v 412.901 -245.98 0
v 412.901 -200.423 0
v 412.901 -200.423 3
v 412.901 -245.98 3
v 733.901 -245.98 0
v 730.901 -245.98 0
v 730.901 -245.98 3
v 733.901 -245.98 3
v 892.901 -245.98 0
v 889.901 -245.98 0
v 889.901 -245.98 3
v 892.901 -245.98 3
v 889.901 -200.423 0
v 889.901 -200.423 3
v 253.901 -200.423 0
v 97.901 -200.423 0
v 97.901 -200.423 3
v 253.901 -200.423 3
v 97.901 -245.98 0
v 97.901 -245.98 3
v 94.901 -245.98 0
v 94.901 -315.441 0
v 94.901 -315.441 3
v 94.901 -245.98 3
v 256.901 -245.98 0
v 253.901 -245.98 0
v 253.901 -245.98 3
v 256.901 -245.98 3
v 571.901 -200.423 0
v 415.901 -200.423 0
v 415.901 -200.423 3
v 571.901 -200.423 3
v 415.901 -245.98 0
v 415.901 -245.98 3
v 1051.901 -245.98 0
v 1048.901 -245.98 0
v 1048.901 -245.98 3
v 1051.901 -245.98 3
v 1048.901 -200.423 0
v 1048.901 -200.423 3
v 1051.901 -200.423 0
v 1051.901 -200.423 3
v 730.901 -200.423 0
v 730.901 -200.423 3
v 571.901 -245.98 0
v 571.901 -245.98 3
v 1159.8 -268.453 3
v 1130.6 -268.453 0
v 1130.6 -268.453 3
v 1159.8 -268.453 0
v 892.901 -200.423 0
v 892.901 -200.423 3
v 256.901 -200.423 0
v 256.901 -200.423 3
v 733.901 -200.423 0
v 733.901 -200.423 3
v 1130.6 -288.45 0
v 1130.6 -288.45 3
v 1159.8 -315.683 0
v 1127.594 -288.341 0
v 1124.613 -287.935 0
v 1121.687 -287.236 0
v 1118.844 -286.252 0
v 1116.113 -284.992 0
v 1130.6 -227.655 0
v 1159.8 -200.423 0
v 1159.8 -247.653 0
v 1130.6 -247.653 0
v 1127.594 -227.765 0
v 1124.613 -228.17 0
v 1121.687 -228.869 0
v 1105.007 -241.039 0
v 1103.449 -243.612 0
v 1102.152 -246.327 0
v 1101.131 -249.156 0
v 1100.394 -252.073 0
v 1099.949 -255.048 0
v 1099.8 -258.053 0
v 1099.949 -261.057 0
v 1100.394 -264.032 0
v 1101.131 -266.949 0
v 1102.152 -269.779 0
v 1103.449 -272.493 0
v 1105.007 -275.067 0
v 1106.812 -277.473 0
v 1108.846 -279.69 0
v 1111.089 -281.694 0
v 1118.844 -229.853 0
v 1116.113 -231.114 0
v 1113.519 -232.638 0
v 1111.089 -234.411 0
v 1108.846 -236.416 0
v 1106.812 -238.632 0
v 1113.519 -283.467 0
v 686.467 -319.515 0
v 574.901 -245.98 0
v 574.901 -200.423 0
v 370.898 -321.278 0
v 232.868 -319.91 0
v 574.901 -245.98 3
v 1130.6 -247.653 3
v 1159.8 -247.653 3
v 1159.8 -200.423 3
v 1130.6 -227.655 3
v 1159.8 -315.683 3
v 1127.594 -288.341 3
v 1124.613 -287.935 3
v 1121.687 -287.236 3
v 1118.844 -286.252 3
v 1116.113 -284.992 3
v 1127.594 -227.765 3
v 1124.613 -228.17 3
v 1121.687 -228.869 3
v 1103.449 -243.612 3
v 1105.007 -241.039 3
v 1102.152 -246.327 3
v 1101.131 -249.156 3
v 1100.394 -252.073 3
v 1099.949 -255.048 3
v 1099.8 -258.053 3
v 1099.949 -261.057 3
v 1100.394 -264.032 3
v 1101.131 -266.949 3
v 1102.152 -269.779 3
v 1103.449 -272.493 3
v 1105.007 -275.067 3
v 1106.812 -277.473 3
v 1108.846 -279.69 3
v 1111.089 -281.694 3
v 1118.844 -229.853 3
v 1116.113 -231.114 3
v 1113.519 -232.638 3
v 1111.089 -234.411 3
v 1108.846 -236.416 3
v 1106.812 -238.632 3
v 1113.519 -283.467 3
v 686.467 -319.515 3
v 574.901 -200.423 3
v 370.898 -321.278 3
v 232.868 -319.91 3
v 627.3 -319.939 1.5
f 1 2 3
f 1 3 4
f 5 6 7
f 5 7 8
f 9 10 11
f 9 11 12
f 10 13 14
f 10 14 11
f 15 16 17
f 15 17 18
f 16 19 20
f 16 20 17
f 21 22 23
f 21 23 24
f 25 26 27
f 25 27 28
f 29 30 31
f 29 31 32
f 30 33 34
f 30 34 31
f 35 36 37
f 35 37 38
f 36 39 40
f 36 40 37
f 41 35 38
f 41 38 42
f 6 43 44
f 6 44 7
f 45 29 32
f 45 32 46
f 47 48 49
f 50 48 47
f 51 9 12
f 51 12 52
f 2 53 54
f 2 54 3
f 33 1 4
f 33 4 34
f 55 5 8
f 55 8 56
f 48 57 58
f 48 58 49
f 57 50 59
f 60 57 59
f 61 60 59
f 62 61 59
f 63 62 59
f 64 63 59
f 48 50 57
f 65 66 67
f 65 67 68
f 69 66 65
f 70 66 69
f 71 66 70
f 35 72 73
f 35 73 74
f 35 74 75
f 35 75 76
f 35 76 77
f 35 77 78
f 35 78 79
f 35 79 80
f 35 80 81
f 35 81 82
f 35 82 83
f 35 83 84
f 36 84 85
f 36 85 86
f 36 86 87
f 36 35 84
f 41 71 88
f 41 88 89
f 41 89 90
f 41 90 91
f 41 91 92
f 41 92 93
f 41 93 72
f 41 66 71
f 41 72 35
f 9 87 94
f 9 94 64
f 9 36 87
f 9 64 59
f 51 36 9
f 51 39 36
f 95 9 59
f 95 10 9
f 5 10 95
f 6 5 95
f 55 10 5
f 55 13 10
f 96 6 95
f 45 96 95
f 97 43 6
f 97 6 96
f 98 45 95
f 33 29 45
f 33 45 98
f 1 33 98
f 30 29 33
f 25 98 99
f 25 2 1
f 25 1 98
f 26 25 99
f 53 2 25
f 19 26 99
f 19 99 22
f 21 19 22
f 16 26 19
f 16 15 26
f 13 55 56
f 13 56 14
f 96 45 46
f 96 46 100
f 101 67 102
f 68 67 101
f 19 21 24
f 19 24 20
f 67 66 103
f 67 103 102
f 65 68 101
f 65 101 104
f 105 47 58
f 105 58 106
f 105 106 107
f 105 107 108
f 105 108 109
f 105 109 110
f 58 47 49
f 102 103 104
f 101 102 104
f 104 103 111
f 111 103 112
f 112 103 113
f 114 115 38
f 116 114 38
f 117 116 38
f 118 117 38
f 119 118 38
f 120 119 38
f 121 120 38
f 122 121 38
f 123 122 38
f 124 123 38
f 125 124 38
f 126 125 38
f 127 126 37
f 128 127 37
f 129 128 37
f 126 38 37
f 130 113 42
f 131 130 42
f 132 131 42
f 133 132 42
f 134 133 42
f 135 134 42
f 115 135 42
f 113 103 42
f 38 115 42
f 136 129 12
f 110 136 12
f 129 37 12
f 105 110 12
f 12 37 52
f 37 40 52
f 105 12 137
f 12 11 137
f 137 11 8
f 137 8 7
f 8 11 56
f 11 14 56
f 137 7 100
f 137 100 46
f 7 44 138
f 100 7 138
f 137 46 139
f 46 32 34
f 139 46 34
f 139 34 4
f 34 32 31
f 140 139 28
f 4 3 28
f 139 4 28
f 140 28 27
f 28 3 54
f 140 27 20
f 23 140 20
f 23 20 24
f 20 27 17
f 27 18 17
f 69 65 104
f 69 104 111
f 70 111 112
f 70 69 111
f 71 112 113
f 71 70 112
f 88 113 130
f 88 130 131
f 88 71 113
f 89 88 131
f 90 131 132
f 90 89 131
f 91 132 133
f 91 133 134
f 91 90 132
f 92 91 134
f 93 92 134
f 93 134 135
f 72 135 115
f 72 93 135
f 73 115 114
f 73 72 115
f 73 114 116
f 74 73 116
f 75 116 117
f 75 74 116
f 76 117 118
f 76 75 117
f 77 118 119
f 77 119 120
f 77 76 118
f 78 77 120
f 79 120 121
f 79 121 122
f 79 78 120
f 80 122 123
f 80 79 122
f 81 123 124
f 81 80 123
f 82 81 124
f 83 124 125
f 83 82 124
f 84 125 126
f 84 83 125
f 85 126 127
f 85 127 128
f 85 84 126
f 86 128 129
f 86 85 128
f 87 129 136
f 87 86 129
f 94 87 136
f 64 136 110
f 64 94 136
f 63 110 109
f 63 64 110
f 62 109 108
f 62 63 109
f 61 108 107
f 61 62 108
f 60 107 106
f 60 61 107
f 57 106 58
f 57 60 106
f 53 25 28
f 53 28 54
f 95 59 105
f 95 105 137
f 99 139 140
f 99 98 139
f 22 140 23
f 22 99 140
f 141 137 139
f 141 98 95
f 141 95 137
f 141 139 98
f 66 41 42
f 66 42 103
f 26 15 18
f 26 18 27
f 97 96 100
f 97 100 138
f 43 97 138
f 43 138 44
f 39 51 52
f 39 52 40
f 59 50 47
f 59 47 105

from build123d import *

# Parameters (mm, degrees)
BOSS_EXTRUDE1_DEPTH = 3


with BuildPart() as part:
    # Model → Boss-Extrude1 (new body)
    with BuildSketch(Plane.XY):
        with BuildLine():
            Line((1159.8, -200.422661621), (1159.8, -247.652661621))
            Line((1159.8, -247.652661621), (1130.6, -247.652661621))
            Line((1130.6, -247.652661621), (1130.6, -227.655293314))
            ThreePointArc((1130.6, -227.655293314), (1099.799999997, -258.052661621), (1130.6, -288.450029928))
            Line((1130.6, -288.450029928), (1130.6, -268.452661621))
            Line((1130.6, -268.452661621), (1159.8, -268.452661621))
            Line((1159.8, -268.452661621), (1159.8, -315.682652611))
            add(Edge.make_bspline(
                [(1159.8, -315.682652611), (982.299469587, -317.054252859), (804.800894245, -318.714261239), (449.798296518, -321.162775901), (272.233603405, -323.726378565), (94.901037796, -315.441313757)],
                knots=[0, 0, 0, 0, 0.5, 0.5, 1, 1, 1, 1], degree=3))
            Line((94.901037796, -315.441313757), (94.901037796, -245.979700014))
            Line((94.901037796, -245.979700014), (97.901037796, -245.979700014))
            Line((97.901037796, -245.979700014), (97.901037796, -200.422661621))
            Line((97.901037796, -200.422661621), (253.901037796, -200.422661621))
            Line((253.901037796, -200.422661621), (253.901037796, -245.979700014))
            Line((253.901037796, -245.979700014), (256.901037795, -245.979700014))
            Line((256.901037795, -245.979700014), (256.901037795, -200.422661621))
            Line((256.901037795, -200.422661621), (412.901037795, -200.422661621))
            Line((412.901037795, -200.422661621), (412.901037795, -245.979700014))
            Line((412.901037795, -245.979700014), (415.901037795, -245.979700014))
            Line((415.901037795, -245.979700014), (415.901037795, -200.422661621))
            Line((415.901037795, -200.422661621), (571.901037795, -200.422661621))
            Line((571.901037795, -200.422661621), (571.901037795, -245.979700014))
            Line((571.901037795, -245.979700014), (574.901037795, -245.979700014))
            Line((574.901037795, -245.979700014), (574.901037795, -200.422661621))
            Line((574.901037795, -200.422661621), (730.901037795, -200.422661621))
            Line((730.901037795, -200.422661621), (730.901037795, -245.979700014))
            Line((730.901037795, -245.979700014), (733.901037795, -245.979700014))
            Line((733.901037795, -245.979700014), (733.901037795, -200.422661621))
            Line((733.901037795, -200.422661621), (889.901037795, -200.422661621))
            Line((889.901037795, -200.422661621), (889.901037795, -245.979700014))
            Line((889.901037795, -245.979700014), (892.901037795, -245.979700014))
            Line((892.901037795, -245.979700014), (892.901037795, -200.422661621))
            Line((892.901037795, -200.422661621), (1048.901037796, -200.422661621))
            Line((1048.901037796, -200.422661621), (1048.901037796, -245.979700014))
            Line((1048.901037796, -245.979700014), (1051.901037795, -245.979700014))
            Line((1051.901037795, -245.979700014), (1051.901037795, -200.422661621))
            Line((1051.901037795, -200.422661621), (1159.8, -200.422661621))
        make_face()
    extrude(amount=BOSS_EXTRUDE1_DEPTH)


solid = part.part
